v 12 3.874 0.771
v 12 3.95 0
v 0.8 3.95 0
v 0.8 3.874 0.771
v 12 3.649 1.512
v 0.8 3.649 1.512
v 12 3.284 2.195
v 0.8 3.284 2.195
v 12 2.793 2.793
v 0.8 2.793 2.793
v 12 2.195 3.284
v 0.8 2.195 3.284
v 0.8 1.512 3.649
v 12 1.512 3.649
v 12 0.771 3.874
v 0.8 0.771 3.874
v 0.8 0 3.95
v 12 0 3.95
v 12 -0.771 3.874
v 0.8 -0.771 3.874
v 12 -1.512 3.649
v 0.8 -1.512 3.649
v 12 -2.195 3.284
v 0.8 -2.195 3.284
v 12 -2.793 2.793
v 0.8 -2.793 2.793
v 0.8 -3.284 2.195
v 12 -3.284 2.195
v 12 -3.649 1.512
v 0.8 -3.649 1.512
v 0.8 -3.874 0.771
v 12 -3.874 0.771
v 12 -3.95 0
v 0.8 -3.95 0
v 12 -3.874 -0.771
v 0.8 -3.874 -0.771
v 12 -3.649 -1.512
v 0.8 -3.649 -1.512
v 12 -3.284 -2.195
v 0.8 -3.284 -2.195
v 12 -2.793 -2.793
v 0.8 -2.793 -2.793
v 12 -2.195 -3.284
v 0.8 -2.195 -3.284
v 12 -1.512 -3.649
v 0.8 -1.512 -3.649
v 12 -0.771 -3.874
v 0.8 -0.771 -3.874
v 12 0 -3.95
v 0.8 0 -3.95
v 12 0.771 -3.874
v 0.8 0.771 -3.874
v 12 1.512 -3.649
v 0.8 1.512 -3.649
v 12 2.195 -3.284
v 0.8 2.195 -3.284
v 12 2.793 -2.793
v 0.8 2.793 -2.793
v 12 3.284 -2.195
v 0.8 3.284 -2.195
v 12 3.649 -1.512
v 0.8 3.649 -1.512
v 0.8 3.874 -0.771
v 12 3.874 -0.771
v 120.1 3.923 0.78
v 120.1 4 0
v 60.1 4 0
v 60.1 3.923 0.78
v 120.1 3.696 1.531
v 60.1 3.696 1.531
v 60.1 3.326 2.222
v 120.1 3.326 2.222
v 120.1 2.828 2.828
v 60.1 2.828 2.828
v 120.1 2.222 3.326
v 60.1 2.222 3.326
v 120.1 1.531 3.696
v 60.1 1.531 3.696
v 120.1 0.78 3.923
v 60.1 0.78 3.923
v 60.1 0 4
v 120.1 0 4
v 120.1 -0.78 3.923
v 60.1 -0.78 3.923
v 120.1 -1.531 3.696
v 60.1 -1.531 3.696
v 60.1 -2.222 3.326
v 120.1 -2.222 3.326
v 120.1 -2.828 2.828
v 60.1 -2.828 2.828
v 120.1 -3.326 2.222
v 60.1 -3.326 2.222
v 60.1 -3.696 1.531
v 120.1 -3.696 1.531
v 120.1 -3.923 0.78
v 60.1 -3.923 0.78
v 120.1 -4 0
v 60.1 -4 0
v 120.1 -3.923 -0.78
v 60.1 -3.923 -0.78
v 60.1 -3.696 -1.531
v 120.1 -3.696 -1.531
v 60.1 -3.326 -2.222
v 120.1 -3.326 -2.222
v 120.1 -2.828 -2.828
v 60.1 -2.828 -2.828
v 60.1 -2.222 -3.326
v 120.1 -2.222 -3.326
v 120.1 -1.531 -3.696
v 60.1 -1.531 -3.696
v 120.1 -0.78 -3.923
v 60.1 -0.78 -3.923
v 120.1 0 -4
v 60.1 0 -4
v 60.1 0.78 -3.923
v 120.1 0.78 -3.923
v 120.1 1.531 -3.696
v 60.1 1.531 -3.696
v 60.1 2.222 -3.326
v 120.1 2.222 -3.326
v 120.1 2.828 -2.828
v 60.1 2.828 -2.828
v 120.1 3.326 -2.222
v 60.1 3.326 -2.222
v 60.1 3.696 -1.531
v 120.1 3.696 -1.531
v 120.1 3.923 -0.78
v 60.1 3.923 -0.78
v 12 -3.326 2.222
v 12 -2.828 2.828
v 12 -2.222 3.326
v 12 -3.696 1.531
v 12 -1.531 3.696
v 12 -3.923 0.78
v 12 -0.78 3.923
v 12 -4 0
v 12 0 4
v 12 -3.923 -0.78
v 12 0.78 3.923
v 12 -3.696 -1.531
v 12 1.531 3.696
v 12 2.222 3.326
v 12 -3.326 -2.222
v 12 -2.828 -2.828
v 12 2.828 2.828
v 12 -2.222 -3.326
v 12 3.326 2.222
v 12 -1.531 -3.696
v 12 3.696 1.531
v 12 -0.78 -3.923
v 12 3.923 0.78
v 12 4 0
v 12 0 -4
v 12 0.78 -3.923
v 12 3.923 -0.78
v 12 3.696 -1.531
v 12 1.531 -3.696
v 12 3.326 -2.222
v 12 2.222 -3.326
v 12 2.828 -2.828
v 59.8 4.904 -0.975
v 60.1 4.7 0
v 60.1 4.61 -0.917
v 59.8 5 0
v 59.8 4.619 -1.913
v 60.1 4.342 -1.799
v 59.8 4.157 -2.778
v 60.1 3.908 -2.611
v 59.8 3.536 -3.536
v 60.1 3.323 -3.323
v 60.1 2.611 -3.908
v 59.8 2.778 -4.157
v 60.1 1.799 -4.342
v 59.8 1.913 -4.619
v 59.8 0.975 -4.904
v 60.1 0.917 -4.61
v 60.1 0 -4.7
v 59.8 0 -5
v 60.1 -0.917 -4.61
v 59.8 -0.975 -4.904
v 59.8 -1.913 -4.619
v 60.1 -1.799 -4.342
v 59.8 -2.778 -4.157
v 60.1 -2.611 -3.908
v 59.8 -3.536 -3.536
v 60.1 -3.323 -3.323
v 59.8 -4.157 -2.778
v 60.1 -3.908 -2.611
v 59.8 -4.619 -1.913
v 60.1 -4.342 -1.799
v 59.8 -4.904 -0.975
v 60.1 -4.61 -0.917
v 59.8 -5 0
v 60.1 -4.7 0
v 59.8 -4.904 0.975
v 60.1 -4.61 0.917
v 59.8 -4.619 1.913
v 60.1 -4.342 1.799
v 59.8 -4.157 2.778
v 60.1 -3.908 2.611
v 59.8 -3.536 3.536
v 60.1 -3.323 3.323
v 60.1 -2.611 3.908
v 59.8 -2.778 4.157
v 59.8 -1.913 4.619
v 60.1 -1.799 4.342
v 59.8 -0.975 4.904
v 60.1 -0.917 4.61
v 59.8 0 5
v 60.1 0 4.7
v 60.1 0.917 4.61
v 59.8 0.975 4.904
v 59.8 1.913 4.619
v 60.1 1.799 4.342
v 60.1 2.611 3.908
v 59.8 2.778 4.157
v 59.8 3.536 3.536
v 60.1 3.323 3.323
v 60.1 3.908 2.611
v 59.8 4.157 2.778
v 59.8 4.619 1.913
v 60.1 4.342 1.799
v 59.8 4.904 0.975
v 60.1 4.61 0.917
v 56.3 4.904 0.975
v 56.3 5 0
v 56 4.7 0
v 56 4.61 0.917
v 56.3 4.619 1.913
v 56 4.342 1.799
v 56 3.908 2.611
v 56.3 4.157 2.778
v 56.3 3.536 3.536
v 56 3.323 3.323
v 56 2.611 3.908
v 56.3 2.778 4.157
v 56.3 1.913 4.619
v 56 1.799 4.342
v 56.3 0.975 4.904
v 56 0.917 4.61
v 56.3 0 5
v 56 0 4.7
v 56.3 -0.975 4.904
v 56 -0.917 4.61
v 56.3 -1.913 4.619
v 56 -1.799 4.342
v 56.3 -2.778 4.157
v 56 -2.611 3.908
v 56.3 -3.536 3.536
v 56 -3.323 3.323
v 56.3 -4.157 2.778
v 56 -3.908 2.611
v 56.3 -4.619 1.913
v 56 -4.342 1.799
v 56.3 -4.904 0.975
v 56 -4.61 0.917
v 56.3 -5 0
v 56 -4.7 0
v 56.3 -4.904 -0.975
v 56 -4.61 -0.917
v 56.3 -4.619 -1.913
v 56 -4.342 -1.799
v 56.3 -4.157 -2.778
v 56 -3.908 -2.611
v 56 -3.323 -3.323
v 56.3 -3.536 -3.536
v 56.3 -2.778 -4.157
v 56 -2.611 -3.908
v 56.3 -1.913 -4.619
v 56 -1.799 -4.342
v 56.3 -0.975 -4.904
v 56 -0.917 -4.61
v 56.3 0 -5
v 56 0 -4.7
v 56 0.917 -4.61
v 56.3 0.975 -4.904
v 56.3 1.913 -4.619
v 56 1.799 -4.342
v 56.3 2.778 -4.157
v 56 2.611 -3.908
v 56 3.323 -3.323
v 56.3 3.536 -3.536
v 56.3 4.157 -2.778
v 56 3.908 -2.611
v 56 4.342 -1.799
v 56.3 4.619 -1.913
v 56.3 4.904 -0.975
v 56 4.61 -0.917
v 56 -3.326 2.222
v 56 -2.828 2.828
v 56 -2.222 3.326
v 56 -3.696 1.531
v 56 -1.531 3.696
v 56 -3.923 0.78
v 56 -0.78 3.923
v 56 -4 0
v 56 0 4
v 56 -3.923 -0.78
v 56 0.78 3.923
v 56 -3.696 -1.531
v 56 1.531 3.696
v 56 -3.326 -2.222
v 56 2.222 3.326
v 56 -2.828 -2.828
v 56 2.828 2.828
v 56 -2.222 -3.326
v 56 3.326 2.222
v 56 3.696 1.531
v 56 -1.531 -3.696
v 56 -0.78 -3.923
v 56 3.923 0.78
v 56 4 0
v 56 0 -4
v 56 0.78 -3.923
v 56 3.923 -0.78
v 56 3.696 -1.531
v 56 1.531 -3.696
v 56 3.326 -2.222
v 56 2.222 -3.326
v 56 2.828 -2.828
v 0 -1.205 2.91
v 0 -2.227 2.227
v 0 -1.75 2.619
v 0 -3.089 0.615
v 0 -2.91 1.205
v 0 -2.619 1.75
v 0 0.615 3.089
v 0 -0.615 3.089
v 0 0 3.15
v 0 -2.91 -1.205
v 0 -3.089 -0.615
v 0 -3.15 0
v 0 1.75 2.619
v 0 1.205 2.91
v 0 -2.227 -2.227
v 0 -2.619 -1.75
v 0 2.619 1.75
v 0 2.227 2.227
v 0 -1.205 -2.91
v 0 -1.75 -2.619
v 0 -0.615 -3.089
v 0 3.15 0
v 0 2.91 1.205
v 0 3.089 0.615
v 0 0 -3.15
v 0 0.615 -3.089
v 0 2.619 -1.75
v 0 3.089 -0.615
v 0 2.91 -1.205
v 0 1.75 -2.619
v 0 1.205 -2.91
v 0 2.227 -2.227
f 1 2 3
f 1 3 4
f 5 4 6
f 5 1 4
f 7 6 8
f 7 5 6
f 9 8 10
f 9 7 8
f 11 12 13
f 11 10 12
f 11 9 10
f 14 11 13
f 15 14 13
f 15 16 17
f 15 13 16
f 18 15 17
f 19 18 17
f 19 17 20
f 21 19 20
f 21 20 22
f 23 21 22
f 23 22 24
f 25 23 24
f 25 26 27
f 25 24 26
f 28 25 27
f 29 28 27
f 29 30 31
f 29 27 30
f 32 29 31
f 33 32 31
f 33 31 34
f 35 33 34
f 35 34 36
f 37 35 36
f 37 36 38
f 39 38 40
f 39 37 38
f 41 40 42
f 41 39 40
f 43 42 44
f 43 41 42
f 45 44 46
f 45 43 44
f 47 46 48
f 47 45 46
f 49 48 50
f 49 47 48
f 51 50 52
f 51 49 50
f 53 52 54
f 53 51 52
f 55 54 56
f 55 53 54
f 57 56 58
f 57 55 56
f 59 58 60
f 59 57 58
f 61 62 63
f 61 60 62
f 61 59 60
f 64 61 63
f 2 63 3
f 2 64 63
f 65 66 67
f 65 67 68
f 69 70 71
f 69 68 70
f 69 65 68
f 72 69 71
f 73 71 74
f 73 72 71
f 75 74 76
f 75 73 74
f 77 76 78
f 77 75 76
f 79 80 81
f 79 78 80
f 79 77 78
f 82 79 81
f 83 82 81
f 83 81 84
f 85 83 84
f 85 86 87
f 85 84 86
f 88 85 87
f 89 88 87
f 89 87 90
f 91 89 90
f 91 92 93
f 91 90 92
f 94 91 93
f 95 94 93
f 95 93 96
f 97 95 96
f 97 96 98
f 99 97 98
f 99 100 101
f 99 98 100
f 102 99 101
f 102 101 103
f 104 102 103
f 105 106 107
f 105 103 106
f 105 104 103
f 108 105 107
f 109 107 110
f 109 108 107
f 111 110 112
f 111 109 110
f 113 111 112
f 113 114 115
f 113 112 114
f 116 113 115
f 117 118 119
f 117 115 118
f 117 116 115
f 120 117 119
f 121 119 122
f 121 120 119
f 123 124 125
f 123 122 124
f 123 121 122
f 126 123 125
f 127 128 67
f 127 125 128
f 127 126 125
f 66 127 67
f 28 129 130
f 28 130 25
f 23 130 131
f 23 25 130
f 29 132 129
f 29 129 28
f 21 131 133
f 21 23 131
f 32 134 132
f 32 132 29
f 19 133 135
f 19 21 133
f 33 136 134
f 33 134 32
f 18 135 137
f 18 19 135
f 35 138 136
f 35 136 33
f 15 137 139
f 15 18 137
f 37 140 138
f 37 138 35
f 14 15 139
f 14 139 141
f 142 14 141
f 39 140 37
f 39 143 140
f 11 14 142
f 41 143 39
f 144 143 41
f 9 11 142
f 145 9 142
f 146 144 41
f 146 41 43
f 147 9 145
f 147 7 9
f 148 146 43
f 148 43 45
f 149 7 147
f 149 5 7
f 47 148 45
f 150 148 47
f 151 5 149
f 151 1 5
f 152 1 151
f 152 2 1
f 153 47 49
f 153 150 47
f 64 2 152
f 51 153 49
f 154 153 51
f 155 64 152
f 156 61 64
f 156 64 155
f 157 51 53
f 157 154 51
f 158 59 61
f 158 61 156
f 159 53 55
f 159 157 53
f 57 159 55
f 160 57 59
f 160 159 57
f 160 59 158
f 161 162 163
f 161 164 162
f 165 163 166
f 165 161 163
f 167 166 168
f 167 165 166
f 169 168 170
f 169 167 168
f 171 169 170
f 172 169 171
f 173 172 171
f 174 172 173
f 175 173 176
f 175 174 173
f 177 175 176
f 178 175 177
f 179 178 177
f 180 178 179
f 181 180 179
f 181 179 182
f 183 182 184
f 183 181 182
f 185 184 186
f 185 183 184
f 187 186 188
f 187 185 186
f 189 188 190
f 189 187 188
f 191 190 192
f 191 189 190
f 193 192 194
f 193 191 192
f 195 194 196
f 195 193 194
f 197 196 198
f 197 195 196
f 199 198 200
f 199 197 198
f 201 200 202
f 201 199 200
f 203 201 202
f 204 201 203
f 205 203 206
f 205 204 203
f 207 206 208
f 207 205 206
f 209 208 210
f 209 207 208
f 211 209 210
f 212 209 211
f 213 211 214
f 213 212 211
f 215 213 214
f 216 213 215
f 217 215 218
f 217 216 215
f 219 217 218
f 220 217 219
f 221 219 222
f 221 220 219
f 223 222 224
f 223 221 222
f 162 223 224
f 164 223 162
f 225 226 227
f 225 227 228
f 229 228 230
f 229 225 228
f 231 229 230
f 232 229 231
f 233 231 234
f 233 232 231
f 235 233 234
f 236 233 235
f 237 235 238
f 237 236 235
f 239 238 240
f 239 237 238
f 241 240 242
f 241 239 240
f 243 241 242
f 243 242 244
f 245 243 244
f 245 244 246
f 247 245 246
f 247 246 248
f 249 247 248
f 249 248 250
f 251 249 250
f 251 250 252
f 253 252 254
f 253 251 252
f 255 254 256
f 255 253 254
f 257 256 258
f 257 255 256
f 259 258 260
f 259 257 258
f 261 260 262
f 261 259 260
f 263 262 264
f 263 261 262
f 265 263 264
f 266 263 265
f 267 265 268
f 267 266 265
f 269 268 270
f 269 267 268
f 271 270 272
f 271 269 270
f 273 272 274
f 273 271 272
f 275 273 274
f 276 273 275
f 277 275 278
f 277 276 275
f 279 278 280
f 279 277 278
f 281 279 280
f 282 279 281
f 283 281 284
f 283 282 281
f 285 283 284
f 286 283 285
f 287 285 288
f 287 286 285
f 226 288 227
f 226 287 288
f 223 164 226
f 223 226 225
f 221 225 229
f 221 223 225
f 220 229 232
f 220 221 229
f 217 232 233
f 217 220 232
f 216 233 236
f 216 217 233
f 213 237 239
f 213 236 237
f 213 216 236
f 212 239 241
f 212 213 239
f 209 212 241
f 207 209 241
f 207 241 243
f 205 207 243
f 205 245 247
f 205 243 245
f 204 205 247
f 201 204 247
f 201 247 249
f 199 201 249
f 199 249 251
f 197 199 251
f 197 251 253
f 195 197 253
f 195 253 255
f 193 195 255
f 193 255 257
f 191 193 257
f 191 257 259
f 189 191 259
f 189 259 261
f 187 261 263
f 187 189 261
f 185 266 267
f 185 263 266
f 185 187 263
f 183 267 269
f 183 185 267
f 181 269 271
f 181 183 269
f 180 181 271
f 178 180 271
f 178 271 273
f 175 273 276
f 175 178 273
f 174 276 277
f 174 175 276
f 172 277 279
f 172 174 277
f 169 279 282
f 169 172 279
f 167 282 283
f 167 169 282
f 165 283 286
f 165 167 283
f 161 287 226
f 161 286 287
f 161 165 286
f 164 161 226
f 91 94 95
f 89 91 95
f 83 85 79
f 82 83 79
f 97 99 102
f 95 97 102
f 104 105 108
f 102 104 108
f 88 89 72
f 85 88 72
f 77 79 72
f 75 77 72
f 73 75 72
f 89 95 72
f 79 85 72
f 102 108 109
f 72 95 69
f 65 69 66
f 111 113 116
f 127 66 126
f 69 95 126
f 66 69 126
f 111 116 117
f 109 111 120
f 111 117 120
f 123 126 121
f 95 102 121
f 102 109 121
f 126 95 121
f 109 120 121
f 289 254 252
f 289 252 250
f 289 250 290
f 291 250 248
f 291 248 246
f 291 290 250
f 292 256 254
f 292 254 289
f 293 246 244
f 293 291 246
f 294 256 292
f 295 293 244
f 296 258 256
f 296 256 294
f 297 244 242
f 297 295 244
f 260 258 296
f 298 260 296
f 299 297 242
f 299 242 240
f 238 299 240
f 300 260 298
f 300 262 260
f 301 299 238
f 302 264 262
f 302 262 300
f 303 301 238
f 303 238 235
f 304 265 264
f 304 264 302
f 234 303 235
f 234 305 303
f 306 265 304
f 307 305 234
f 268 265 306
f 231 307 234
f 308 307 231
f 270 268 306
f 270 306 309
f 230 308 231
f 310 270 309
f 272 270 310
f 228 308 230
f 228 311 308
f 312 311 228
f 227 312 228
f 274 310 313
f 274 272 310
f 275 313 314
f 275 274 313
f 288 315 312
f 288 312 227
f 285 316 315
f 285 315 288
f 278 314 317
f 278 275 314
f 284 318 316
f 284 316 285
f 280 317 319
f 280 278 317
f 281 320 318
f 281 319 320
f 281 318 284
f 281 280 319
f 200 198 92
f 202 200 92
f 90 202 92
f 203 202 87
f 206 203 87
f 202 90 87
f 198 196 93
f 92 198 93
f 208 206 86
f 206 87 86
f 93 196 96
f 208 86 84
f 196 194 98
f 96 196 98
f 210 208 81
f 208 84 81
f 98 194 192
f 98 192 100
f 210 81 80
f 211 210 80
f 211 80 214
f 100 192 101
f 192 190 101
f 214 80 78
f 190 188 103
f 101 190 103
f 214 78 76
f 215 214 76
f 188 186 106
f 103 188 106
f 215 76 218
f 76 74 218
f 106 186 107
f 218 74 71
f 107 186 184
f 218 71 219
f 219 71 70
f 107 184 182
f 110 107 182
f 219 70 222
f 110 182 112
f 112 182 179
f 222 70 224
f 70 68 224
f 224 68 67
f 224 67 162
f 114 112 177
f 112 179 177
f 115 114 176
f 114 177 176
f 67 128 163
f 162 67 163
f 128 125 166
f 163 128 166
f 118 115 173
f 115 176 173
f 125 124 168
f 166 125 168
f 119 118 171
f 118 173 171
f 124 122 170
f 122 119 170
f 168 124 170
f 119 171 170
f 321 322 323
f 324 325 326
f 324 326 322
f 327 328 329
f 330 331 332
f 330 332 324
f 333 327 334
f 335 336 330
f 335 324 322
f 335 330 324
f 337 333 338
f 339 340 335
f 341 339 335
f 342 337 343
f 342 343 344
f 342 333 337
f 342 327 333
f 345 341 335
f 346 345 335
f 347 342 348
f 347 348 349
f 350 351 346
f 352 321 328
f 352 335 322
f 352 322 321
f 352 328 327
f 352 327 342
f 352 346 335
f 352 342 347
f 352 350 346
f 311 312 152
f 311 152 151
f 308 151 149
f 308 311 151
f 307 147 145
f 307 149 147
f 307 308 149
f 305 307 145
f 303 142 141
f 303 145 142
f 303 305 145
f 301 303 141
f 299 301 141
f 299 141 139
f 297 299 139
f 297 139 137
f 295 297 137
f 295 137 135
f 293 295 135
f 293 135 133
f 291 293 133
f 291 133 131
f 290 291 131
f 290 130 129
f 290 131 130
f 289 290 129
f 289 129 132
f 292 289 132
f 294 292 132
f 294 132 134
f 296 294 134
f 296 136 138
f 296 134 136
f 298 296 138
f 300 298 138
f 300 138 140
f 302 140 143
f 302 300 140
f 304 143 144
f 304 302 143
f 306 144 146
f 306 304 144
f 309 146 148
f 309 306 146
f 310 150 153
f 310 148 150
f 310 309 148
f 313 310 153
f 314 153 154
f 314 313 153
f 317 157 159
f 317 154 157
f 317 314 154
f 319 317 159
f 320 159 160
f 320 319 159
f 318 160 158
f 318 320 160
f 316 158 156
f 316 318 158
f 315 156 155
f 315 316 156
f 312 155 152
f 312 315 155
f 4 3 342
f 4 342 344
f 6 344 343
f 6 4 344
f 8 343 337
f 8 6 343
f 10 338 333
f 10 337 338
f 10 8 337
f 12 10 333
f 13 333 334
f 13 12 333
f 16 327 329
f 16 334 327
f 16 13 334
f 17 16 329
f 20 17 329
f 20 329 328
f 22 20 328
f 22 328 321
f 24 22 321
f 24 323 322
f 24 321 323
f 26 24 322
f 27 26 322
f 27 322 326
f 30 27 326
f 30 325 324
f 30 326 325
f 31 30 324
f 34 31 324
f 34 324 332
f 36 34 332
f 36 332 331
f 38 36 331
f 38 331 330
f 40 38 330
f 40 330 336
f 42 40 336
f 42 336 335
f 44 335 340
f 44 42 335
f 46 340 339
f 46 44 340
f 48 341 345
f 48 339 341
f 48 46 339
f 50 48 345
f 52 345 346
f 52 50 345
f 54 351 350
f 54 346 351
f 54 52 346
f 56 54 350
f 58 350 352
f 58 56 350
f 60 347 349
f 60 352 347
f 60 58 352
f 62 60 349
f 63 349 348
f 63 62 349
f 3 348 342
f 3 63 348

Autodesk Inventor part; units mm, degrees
ref_plane "YZ Plane" through (0, 0, 0) normal (1, 0, 0) x (0, 1, 0)
ref_plane "XZ Plane" through (0, 0, 0) normal (0, 1, 0) x (-1, 0, 0)
ref_plane "XY Plane" through (0, 0, 0) normal (0, 0, 1) x (1, 0, 0)
sketch "Skizze1" plane through (0, 0, 0) normal (0, 0, 1) x (1, 0, 0)
  line L0 (0, 0) -> (0, 3.95)
  line L1 (0, 3.95) -> (12, 3.95)
  line L2 (12, 3.95) -> (12, 4)
  line L3 (12, 4) -> (56, 4)
  line L4 (56, 4) -> (56, 5)
  line L5 (56, 5) -> (60.1, 5)
  line L6 (60.1, 5) -> (60.1, 4)
  line L7 (60.1, 4) -> (120.1, 4)
  line L8 (120.1, 4) -> (120.1, 0)
  line L9 (120.1, 0) -> (0, 0)
  dimension "d0" = 3.95
  dimension "d1" = 12
  dimension "d3" = 4
  dimension "d6" = 44
  dimension "d8" = 48.1
  dimension "d9" = 5
  dimension "d10" = 60
revolve "Umdrehung1" add sketch "Skizze1" angle 360 about axis through (120.1, 0, 0) along (-1, 0, 0)
thread "Gewinde1" size "M8x1.25" class "6g" standard "ANSI Metric M Profile" full length
chamfer "Fase1" distance 0.8 angle 45 1 edges at (0, -3.95, 0)
chamfer "Fase2" distance 0.3 angle 45 2 edges at (56, -5, 0) (60.1, -5, 0)
properties part number "Welle"
